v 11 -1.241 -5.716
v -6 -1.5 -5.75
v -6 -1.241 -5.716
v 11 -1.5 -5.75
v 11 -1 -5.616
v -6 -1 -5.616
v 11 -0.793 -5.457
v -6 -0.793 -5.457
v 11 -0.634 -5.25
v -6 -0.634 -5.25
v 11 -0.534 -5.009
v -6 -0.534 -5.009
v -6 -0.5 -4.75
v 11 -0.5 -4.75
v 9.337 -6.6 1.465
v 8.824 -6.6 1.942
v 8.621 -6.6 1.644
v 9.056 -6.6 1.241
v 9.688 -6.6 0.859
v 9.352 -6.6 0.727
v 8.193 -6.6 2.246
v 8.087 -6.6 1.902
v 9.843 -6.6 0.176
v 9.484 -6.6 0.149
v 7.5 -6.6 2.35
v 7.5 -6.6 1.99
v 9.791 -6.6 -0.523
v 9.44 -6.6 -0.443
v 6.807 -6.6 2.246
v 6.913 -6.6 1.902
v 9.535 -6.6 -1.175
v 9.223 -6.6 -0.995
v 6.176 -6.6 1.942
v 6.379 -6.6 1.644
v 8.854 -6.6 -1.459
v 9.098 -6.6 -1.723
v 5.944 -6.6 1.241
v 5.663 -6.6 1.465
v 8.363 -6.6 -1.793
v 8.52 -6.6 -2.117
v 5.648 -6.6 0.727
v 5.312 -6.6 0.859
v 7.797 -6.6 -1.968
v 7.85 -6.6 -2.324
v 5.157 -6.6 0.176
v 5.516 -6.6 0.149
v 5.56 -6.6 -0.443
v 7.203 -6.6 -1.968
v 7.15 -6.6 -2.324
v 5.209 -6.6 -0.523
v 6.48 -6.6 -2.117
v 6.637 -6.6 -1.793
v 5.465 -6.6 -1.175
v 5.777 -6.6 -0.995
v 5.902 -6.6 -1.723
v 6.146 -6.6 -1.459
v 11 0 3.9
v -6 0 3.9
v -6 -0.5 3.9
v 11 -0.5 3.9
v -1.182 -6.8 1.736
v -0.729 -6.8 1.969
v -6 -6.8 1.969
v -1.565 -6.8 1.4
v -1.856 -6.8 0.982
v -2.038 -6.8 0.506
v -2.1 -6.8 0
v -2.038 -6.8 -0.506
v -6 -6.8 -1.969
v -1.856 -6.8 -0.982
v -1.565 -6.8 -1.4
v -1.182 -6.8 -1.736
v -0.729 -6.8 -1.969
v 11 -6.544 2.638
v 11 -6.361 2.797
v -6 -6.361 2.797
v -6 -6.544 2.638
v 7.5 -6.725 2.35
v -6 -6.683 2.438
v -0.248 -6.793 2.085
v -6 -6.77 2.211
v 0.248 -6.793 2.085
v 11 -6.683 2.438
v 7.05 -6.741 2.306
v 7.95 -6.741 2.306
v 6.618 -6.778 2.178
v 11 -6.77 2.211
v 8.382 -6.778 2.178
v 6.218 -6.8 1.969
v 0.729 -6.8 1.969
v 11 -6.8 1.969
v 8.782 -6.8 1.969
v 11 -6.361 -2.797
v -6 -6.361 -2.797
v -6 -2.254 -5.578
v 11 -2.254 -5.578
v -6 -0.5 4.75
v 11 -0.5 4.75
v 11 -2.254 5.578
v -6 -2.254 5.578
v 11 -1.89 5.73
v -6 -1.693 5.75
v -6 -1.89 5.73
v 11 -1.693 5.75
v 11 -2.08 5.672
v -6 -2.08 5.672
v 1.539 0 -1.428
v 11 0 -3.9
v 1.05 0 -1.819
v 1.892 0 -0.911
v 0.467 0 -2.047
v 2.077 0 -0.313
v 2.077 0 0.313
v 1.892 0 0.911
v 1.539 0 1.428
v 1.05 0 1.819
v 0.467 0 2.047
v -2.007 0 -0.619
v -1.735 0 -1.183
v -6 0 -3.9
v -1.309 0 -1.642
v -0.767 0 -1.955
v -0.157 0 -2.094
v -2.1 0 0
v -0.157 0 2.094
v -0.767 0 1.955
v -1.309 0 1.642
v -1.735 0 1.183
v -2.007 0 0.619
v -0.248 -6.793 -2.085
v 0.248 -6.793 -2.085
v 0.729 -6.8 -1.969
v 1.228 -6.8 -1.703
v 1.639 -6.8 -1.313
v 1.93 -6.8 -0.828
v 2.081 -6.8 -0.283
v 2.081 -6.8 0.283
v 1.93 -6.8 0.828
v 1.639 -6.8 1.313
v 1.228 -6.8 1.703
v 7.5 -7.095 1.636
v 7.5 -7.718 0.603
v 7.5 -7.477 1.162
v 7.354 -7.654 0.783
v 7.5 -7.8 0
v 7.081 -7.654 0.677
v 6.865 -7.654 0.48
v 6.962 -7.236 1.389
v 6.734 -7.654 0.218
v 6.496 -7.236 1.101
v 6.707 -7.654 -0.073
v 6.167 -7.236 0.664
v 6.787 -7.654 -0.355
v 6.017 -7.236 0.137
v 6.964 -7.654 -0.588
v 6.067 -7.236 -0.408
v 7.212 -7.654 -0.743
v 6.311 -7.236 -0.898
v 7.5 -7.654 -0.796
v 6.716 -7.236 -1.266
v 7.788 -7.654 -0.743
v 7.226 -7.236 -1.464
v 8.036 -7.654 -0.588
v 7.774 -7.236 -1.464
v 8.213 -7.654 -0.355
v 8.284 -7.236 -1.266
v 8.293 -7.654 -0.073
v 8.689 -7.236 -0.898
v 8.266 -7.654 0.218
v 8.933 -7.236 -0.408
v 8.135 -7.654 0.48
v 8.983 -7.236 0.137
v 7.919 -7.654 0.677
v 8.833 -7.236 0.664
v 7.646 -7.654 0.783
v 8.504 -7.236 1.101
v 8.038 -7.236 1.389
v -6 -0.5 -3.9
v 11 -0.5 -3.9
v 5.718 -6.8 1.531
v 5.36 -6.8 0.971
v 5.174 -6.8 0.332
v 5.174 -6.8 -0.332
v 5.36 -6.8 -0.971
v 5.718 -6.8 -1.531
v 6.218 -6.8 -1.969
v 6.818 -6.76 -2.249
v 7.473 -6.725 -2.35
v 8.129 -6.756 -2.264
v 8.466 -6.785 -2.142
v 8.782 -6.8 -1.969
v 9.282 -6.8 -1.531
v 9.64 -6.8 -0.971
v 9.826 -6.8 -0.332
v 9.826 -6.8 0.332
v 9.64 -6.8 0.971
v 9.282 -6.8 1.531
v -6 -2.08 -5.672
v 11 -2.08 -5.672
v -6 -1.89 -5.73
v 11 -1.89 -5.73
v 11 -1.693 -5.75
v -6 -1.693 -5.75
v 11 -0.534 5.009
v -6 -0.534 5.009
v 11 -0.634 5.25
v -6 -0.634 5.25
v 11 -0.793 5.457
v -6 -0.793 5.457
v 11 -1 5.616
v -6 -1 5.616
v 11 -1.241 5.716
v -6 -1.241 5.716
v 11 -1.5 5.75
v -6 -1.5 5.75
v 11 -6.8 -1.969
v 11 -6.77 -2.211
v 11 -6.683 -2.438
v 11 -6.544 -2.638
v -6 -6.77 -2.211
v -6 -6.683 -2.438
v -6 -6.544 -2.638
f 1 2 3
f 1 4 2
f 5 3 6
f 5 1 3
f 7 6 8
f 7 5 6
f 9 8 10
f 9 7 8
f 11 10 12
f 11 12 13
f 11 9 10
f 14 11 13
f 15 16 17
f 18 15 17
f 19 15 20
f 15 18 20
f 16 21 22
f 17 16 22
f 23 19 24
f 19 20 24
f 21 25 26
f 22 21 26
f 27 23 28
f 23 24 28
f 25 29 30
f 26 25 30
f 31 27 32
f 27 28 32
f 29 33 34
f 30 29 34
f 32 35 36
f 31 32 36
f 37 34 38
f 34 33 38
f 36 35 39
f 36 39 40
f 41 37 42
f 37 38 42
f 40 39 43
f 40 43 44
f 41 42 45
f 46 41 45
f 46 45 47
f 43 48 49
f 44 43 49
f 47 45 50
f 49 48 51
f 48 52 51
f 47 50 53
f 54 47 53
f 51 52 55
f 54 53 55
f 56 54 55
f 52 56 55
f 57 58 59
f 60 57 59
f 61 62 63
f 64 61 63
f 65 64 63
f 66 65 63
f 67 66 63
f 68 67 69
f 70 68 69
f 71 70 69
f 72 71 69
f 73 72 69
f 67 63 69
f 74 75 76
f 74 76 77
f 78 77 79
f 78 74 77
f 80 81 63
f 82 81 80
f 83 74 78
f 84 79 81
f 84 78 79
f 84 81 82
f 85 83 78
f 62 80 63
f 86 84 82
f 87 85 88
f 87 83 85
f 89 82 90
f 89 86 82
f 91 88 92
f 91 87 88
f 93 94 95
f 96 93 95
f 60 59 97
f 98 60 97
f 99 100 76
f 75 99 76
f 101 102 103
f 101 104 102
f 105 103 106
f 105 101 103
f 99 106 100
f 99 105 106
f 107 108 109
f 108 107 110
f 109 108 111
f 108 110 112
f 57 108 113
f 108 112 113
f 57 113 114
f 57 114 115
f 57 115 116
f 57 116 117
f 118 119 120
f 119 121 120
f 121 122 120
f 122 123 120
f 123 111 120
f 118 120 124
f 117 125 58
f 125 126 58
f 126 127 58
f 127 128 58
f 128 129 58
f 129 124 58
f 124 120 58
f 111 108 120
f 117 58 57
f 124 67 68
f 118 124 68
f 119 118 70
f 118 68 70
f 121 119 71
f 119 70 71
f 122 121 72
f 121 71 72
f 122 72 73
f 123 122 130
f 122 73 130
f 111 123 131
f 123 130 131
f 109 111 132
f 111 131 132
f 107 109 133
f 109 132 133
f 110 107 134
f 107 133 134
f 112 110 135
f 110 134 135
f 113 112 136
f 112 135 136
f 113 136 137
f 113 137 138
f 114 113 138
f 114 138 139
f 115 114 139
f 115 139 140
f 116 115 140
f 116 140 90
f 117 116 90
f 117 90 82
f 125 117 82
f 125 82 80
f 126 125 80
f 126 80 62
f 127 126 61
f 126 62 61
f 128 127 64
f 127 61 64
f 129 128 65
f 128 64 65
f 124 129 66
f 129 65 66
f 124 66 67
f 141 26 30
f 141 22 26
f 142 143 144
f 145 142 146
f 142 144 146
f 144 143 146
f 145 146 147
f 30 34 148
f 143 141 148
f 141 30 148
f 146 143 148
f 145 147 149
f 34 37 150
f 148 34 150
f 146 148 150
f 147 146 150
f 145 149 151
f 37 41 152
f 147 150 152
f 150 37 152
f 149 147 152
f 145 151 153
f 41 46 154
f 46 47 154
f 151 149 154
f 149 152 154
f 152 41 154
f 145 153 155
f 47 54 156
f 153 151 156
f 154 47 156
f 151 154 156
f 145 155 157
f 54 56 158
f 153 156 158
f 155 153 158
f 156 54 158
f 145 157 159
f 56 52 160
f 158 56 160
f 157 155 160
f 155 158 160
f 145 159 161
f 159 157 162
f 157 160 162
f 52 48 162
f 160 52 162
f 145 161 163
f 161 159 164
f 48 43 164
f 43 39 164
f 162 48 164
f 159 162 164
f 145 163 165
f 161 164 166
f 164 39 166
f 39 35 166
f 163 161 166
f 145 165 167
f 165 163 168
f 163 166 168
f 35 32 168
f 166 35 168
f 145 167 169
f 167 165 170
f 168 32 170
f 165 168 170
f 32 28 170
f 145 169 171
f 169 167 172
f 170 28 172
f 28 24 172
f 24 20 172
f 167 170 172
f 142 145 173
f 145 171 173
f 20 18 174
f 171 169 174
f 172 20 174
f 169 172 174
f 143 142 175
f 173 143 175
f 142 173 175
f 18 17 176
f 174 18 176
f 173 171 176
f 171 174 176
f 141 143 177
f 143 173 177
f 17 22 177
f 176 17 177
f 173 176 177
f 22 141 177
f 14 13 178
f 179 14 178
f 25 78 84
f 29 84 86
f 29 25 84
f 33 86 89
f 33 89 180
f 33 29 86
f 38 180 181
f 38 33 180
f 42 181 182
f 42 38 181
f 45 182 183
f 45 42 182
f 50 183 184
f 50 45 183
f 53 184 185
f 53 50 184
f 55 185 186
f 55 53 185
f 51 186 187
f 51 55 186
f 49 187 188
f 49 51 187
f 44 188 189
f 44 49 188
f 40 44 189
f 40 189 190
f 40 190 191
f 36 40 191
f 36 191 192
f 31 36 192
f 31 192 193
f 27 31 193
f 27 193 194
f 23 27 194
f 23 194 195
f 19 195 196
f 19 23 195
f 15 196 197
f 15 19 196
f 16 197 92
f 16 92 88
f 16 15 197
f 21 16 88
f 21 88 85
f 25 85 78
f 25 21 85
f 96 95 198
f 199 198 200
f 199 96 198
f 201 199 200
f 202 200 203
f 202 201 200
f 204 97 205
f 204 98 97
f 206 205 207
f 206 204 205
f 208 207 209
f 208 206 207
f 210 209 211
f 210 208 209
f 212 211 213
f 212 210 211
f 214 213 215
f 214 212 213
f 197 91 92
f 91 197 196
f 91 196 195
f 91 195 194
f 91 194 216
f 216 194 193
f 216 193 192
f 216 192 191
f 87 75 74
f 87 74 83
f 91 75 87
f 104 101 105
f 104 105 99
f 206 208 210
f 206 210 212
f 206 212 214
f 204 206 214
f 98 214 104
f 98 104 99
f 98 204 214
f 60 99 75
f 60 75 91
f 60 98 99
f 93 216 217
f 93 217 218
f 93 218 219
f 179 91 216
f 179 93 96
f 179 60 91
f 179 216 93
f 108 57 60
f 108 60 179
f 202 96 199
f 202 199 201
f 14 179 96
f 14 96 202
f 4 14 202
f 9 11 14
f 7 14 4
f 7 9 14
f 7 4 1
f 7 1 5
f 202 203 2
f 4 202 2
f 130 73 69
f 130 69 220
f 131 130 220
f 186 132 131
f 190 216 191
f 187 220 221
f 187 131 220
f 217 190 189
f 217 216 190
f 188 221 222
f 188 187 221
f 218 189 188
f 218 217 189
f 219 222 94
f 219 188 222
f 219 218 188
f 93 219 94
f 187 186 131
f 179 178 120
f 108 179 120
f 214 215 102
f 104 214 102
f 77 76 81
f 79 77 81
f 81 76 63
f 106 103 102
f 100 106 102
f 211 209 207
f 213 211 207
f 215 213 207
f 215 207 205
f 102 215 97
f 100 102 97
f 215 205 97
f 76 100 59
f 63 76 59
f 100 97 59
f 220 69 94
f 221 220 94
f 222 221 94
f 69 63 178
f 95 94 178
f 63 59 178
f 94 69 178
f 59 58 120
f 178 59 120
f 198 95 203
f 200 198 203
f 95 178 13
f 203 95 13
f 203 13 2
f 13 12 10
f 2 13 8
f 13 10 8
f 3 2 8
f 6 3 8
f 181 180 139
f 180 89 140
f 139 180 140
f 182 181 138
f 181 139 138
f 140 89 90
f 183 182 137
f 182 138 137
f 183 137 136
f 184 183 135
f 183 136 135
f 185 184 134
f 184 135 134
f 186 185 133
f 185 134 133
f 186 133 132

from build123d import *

# Parameters (mm, degrees)
BOSS_EXTRUDE1_DEPTH = 17
FILLET1_R           = 1
SKETCH2_W           = 2.35
SKETCH2_H           = 0.2
TAPPED_HOLE1_D      = 4.2


with BuildPart() as part:
    # Sketch1 → Boss-Extrude1 (new body)
    with BuildSketch(Plane(origin=(-6, 0, 0), x_dir=(0, 0, -1), z_dir=(1, 0, 0))):
        Polygon((3.9, 0), (-3.9, 0), (-3.9, -0.5), (-5.75, -0.5), (-5.75, -2), (-2.5, -6.8), (2.5, -6.8), (5.75, -2), (5.75, -0.5), (3.9, -0.5), align=None)
    extrude(amount=BOSS_EXTRUDE1_DEPTH)

    # Fillet1
    fillet1_edges = [part.edges().sort_by_distance(p)[0] for p in [
        (2.5, -0.5, 5.75),
        (2.5, -0.5, -5.75),
        (2.5, -2, -5.75),
        (2.5, -6.8, -2.5),
        (2.5, -6.8, 2.5),
        (2.5, -2, 5.75),
    ]]
    fillet(fillet1_edges, radius=FILLET1_R)

    # Sketch2 → Cut-Revolve1 (revolve, cut)
    with BuildSketch(Plane(origin=(7.5, 0, 0), x_dir=(0, 0, -1), z_dir=(1, 0, 0)), mode=Mode.PRIVATE) as cut_revolve1_sk:
        with Locations((1.175, -6.7)):
            Rectangle(SKETCH2_W, SKETCH2_H)
    revolve(cut_revolve1_sk.sketch.rotate(Axis((7.5, 1.665548573, 0), (0, -1, 0)), 180), axis=Axis((7.5, 1.665548573, 0), (0, -1, 0)), mode=Mode.SUBTRACT)

    # Sketch3 → Revolve1 (revolve)
    with BuildSketch(Plane(origin=(7.5, 0, 0), x_dir=(0, 0, -1), z_dir=(1, 0, 0)), mode=Mode.PRIVATE) as revolve1_sk:
        with BuildLine():
            Line((1.989974874, -6.6), (0, -6.6))
            Line((0, -6.6), (0, -7.8))
            ThreePointArc((0, -7.8), (1.161895004, -7.476784887), (1.989974874, -6.6))
        make_face()
    revolve(revolve1_sk.sketch.rotate(Axis((7.5, 0, 0), (0, -1, 0)), 180), axis=Axis((7.5, 0, 0), (0, -1, 0)))

    # Tapped Hole1 (through all)
    with Locations(Plane(origin=(0, 0, 0), x_dir=(1, 0, 0), z_dir=(0, 1, 0))):
        with Locations((0, 0)):
            Hole(TAPPED_HOLE1_D / 2)


solid = part.part
